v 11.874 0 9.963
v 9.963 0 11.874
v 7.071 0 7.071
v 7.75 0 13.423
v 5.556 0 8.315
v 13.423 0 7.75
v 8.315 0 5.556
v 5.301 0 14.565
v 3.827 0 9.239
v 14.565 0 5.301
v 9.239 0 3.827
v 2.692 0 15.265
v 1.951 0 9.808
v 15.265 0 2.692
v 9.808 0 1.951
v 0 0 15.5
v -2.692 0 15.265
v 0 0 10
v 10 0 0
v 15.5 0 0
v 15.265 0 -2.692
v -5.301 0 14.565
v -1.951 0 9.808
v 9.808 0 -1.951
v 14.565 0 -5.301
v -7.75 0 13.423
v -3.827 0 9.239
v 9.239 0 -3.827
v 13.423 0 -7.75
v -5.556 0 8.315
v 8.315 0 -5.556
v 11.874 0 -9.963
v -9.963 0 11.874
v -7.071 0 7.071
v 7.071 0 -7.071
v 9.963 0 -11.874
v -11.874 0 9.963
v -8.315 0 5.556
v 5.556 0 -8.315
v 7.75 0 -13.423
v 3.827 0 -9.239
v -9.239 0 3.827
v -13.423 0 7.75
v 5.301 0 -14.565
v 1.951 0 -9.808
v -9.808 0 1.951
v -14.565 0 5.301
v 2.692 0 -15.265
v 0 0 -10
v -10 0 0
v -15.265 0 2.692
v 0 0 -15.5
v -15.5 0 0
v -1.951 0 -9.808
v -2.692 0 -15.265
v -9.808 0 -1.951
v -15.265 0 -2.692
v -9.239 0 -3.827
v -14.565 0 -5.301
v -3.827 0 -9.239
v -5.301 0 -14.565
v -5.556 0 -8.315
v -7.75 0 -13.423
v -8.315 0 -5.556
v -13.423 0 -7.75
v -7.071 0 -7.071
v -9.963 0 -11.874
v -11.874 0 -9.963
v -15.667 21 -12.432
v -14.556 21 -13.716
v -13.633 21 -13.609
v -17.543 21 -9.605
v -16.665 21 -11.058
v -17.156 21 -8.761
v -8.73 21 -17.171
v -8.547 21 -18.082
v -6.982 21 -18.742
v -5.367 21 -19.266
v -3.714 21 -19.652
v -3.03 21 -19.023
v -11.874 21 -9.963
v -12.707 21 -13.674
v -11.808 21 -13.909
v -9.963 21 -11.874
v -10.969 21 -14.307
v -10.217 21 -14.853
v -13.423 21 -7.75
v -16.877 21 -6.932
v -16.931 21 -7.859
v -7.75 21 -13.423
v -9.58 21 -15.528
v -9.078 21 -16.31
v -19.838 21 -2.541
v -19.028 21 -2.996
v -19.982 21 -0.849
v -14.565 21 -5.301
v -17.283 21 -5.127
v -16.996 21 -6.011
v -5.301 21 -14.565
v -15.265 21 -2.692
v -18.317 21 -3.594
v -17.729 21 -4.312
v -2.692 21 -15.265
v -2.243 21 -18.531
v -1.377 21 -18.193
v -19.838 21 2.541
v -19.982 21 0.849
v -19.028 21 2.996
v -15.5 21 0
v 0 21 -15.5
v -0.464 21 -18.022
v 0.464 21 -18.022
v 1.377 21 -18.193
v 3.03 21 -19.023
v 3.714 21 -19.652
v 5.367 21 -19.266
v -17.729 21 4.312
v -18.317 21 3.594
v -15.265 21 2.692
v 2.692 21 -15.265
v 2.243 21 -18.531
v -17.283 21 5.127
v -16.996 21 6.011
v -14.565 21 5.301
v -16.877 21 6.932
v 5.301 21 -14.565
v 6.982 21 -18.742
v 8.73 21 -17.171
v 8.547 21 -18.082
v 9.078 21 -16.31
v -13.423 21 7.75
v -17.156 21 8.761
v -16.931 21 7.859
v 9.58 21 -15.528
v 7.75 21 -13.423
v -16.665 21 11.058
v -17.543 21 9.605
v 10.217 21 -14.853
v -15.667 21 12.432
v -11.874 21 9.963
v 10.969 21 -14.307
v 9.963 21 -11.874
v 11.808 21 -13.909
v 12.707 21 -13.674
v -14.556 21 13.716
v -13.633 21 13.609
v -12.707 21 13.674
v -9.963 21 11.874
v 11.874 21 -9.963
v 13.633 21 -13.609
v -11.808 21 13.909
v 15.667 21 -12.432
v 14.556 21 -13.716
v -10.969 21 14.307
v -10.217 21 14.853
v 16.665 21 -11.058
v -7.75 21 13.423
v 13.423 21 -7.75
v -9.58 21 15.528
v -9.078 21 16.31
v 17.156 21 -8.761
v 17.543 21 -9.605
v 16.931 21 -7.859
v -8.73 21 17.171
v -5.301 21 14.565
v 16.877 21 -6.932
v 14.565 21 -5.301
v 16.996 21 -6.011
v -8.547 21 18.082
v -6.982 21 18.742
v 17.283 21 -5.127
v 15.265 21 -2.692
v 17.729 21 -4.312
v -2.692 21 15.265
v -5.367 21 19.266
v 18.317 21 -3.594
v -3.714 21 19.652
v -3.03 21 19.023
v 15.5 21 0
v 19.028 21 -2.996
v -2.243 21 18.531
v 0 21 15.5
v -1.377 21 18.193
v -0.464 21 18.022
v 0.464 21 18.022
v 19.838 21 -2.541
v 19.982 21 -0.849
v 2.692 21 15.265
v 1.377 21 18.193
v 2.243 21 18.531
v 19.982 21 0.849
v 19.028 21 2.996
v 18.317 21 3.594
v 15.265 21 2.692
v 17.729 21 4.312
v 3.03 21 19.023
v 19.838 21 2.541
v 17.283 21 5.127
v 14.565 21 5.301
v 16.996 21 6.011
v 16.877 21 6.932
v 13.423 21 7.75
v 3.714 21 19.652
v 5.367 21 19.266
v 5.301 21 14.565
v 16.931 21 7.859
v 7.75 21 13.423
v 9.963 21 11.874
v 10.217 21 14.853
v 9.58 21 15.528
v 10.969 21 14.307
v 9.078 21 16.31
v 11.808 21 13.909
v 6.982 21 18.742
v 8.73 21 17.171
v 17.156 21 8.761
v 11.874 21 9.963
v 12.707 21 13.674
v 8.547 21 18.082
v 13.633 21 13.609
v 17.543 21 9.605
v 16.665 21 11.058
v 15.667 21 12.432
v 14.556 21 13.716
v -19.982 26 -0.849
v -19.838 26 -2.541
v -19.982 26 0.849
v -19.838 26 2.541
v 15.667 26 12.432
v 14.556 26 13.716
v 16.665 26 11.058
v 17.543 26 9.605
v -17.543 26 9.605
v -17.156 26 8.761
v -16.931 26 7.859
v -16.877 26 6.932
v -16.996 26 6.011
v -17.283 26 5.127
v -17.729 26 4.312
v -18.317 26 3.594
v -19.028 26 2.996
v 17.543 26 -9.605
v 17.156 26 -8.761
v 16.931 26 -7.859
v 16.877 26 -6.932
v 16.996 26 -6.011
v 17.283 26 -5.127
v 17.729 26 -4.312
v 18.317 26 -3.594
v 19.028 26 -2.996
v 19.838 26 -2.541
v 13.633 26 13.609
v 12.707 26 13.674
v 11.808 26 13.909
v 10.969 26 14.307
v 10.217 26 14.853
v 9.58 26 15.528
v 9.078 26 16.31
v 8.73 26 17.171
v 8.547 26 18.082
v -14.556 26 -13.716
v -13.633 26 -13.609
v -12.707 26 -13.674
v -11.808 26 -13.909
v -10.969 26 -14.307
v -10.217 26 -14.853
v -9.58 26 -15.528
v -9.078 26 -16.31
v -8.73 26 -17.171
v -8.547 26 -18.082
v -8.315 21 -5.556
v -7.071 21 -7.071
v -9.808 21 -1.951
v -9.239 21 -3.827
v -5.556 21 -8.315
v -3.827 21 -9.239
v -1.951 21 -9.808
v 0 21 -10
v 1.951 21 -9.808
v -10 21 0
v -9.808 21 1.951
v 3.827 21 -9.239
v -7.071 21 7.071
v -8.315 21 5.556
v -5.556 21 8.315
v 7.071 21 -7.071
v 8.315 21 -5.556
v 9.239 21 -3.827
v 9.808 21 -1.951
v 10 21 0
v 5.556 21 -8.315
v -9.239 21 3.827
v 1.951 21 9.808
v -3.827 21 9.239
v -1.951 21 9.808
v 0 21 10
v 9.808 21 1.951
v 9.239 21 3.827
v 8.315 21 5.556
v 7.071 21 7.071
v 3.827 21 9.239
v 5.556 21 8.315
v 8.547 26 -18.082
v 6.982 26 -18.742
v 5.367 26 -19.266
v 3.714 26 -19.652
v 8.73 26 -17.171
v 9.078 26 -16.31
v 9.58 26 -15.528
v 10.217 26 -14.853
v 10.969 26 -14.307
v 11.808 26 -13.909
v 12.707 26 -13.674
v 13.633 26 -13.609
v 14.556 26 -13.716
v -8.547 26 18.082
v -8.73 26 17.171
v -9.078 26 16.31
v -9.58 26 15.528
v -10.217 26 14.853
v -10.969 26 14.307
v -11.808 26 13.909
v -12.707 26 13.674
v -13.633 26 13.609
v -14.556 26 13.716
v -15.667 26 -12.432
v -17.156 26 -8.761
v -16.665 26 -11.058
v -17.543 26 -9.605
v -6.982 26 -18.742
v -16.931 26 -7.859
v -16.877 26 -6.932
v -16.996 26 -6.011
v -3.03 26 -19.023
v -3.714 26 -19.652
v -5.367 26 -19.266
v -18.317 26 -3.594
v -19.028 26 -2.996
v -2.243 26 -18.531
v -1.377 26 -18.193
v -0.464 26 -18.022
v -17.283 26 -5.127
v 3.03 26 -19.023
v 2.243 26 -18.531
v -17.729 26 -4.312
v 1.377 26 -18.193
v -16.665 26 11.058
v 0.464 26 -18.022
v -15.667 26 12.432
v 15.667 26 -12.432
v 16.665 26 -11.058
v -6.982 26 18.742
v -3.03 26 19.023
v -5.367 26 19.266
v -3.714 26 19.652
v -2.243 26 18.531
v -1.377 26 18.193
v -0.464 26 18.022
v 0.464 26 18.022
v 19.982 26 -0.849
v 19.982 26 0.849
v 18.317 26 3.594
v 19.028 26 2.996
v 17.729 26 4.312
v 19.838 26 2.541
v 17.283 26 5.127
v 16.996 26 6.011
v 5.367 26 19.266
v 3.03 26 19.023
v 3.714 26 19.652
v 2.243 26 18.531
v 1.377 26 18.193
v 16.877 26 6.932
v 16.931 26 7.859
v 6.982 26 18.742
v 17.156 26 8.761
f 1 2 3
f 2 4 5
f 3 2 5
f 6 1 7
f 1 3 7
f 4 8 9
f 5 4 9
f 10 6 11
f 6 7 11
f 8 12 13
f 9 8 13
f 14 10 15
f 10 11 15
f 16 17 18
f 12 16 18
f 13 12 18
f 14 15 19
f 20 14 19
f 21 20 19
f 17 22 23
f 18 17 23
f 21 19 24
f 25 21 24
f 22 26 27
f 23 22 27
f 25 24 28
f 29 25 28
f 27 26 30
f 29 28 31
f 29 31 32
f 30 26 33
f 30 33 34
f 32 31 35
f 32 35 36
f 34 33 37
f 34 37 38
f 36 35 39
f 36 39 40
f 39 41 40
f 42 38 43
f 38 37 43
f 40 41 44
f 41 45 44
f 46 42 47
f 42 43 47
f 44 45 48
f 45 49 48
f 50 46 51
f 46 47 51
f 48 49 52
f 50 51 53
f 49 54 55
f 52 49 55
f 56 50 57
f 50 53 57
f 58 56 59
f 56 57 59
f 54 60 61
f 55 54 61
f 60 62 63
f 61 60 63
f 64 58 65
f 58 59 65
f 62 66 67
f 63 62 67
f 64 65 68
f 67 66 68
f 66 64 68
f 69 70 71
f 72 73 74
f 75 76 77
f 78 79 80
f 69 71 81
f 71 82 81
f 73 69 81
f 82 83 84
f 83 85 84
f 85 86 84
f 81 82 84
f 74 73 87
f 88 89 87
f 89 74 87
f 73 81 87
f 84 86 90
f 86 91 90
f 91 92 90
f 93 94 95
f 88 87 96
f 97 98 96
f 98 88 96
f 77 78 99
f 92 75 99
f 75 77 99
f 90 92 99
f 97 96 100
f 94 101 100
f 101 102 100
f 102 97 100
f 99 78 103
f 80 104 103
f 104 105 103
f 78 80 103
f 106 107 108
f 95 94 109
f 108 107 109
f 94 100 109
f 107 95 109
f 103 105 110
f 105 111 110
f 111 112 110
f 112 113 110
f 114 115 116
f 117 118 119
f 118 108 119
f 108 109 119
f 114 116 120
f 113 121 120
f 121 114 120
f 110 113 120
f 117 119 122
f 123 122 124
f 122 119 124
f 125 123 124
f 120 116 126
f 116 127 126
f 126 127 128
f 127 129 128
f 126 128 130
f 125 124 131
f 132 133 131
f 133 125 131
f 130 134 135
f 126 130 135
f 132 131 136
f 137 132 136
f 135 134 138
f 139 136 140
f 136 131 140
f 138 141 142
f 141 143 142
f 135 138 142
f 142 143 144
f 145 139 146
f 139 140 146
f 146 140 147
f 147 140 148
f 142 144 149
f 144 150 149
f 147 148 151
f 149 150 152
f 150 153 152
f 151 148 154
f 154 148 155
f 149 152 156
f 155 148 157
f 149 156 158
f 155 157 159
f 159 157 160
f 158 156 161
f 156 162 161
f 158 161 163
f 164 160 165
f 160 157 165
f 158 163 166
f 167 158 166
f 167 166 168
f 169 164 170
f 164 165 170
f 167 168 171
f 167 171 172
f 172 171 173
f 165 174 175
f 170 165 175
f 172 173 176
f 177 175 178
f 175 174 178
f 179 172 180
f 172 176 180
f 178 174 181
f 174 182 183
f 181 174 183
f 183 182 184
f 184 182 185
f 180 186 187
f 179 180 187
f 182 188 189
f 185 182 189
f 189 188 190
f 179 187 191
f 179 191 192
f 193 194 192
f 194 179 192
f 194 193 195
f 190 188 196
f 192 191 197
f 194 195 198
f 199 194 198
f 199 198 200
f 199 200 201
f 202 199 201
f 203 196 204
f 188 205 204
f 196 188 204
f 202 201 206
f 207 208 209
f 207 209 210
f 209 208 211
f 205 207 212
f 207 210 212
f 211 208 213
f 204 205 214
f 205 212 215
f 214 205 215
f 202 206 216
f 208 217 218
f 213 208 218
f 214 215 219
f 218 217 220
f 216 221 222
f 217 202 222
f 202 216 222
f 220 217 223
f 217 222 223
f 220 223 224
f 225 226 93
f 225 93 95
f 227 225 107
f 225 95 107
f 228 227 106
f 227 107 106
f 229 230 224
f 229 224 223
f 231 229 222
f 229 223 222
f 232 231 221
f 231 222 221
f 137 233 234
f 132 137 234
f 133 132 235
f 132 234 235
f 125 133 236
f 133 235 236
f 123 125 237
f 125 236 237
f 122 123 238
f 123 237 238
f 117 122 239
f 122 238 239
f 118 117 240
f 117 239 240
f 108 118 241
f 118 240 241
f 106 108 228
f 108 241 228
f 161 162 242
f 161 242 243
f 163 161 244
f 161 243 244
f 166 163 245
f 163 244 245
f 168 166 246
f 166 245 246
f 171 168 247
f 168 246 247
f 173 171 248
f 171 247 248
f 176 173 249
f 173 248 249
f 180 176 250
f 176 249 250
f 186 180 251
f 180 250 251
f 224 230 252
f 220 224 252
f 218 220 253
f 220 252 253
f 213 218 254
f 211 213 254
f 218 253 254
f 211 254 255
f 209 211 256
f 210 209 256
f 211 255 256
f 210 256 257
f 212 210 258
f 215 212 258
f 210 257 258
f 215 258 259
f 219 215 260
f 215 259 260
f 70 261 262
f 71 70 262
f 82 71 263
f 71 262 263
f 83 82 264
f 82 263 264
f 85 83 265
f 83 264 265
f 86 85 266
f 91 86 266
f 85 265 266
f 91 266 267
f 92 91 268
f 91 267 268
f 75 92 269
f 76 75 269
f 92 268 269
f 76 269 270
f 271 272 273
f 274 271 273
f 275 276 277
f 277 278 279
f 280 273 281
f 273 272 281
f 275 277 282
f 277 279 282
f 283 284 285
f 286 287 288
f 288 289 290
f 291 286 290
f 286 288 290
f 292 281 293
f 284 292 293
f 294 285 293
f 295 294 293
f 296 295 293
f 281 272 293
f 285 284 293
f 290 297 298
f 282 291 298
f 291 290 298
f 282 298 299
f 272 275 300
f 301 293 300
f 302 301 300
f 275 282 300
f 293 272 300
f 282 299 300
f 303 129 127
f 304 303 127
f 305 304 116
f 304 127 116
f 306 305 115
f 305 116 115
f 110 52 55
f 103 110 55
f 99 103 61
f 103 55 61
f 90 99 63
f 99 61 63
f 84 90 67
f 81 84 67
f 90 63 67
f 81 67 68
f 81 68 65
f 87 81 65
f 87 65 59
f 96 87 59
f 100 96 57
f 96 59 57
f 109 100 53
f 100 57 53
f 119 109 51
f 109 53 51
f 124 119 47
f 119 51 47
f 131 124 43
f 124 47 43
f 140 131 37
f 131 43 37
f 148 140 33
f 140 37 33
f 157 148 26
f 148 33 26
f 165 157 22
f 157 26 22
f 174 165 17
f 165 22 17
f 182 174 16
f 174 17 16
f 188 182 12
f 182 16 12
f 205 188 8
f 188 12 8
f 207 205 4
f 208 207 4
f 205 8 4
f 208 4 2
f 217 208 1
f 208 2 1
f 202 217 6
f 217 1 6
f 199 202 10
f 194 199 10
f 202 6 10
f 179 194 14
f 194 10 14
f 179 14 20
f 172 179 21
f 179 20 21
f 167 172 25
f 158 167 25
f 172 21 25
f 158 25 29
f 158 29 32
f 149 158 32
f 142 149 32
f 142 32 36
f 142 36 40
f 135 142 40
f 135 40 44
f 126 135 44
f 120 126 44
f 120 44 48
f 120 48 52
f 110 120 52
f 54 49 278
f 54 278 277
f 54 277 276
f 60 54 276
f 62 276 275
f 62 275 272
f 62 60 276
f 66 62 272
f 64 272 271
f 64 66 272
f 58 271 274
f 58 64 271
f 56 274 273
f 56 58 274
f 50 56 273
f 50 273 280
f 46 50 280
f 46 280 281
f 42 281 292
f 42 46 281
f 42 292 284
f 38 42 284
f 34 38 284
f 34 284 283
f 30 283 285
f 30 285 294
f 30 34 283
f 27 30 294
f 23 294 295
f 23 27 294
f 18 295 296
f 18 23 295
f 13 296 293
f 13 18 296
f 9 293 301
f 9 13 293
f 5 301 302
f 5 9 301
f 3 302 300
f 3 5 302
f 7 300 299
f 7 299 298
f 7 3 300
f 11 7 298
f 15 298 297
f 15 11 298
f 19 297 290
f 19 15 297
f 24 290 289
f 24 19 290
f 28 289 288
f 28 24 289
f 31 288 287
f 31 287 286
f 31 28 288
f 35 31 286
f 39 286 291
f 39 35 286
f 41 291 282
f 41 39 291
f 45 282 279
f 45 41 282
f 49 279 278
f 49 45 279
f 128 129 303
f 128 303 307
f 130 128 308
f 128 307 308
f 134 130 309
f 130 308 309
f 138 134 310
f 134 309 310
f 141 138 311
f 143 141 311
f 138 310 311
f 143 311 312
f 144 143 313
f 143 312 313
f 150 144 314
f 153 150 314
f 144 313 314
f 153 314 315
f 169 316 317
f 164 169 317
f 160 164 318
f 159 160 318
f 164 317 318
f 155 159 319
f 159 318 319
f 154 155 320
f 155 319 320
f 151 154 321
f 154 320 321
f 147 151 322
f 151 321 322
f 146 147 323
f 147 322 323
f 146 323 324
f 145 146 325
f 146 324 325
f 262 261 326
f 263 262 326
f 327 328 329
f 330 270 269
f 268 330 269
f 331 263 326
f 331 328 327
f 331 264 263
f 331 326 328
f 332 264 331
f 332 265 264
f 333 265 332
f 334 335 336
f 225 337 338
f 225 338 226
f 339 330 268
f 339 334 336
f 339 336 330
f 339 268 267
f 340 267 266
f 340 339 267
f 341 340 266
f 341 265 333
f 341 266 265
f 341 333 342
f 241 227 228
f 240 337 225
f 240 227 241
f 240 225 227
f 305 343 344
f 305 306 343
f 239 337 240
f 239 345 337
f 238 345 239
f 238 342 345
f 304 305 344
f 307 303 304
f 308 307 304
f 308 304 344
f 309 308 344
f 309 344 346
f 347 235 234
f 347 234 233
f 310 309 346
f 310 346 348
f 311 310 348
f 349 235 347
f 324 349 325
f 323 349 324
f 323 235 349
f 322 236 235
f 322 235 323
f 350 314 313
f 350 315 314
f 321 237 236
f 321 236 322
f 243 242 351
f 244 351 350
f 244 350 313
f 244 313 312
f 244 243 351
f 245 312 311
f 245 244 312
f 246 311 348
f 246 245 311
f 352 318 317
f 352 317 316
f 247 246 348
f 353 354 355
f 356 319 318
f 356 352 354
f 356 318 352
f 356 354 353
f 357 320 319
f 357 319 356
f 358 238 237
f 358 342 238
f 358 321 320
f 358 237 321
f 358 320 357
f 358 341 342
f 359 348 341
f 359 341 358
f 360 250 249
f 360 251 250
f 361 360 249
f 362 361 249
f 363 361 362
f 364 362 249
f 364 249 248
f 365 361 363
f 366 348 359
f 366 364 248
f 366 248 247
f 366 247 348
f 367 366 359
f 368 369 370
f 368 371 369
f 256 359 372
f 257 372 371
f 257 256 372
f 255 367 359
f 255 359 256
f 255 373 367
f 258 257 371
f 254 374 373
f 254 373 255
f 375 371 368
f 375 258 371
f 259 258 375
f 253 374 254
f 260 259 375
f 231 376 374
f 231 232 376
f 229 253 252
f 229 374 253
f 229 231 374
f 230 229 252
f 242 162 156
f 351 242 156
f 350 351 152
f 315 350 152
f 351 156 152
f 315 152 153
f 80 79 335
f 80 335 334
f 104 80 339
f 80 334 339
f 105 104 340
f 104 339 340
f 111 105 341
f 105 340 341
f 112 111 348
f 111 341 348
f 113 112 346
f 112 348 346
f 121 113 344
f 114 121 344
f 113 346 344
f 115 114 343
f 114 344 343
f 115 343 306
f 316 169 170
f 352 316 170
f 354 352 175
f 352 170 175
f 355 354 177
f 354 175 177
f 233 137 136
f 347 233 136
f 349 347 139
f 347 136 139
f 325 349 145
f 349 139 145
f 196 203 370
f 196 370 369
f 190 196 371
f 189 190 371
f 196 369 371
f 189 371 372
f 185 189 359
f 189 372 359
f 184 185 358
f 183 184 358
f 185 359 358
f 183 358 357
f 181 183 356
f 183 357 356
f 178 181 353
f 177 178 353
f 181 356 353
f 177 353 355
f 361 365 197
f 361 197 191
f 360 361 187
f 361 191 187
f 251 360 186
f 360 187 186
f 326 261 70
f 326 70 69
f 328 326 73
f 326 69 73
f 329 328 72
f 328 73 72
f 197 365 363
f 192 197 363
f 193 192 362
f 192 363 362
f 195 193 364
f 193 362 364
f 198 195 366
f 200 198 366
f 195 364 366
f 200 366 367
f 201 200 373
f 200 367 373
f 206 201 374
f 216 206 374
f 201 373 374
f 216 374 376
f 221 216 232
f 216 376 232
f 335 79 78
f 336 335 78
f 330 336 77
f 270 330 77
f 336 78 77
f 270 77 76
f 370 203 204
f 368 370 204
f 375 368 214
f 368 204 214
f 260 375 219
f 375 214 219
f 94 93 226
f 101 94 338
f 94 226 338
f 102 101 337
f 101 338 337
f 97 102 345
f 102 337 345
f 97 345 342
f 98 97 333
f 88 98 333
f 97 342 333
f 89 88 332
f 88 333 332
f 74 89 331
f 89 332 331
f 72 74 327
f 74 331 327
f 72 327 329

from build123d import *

# Parameters (mm, degrees)
CROQUIS1_R              = 15.5
CROQUIS1_R_2            = 10
SALIENTE_EXTRUIR1_DEPTH = 21
CROQUIS2_R              = 23
SALIENTE_EXTRUIR2_DEPTH = 5
CROQUIS3_R              = 5
CORTAR_EXTRUIR1_DEPTH   = 5
CORTAR_EXTRUIR2_START   = -5
CROQUIS4_R              = 23
CROQUIS4_R_2            = 20
CORTAR_EXTRUIR2_DEPTH   = 5


with BuildPart() as part:
    # Croquis1 → Saliente-Extruir1 (new body)
    with BuildSketch(Plane(origin=(0, 0, 0), x_dir=(1, 0, 0), z_dir=(0, 1, 0))):
        with Locations(Location((0, 0, 0), (0, 0, 90))):
            Circle(CROQUIS1_R)
        with Locations(Location((0, 0, 0), (0, 0, 90))):
            Circle(CROQUIS1_R_2, mode=Mode.SUBTRACT)
    extrude(amount=SALIENTE_EXTRUIR1_DEPTH)

    # Croquis2 → Saliente-Extruir2 (add)
    with BuildSketch(Plane(origin=(0, 21, 0), x_dir=(1, 0, 0), z_dir=(0, 1, 0))):
        with Locations(Location((0, 0, 0), (0, 0, 270))):
            Circle(CROQUIS2_R)
    extrude(amount=SALIENTE_EXTRUIR2_DEPTH)

    # Croquis3 → Cortar-Extruir1 (cut)
    with BuildSketch(Plane(origin=(0, 26, 0), x_dir=(1, 0, 0), z_dir=(0, 1, 0))):
        with Locations((0, 23)):
            Circle(CROQUIS3_R)
        with Locations((13.519060803, 18.607390871)):
            Circle(CROQUIS3_R)
        with Locations((21.874299875, 7.107390871)):
            Circle(CROQUIS3_R)
        with Locations((21.874299875, -7.107390871)):
            Circle(CROQUIS3_R)
        with Locations((13.519060803, -18.607390871)):
            Circle(CROQUIS3_R)
        with Locations((0, -23)):
            Circle(CROQUIS3_R)
        with Locations((-13.519060803, -18.607390871)):
            Circle(CROQUIS3_R)
        with Locations((-21.874299875, -7.107390871)):
            Circle(CROQUIS3_R)
        with Locations((-21.874299875, 7.107390871)):
            Circle(CROQUIS3_R)
        with Locations((-13.519060803, 18.607390871)):
            Circle(CROQUIS3_R)
    extrude(amount=-CORTAR_EXTRUIR1_DEPTH, mode=Mode.SUBTRACT)

    # Croquis4 → Cortar-Extruir2 (cut)
    with BuildSketch(Plane(origin=(0, 26, 0), x_dir=(1, 0, 0), z_dir=(0, 1, 0)).offset(CORTAR_EXTRUIR2_START)):
        Circle(CROQUIS4_R)
        Circle(CROQUIS4_R_2, mode=Mode.SUBTRACT)
    extrude(amount=CORTAR_EXTRUIR2_DEPTH, mode=Mode.SUBTRACT)


solid = part.part
